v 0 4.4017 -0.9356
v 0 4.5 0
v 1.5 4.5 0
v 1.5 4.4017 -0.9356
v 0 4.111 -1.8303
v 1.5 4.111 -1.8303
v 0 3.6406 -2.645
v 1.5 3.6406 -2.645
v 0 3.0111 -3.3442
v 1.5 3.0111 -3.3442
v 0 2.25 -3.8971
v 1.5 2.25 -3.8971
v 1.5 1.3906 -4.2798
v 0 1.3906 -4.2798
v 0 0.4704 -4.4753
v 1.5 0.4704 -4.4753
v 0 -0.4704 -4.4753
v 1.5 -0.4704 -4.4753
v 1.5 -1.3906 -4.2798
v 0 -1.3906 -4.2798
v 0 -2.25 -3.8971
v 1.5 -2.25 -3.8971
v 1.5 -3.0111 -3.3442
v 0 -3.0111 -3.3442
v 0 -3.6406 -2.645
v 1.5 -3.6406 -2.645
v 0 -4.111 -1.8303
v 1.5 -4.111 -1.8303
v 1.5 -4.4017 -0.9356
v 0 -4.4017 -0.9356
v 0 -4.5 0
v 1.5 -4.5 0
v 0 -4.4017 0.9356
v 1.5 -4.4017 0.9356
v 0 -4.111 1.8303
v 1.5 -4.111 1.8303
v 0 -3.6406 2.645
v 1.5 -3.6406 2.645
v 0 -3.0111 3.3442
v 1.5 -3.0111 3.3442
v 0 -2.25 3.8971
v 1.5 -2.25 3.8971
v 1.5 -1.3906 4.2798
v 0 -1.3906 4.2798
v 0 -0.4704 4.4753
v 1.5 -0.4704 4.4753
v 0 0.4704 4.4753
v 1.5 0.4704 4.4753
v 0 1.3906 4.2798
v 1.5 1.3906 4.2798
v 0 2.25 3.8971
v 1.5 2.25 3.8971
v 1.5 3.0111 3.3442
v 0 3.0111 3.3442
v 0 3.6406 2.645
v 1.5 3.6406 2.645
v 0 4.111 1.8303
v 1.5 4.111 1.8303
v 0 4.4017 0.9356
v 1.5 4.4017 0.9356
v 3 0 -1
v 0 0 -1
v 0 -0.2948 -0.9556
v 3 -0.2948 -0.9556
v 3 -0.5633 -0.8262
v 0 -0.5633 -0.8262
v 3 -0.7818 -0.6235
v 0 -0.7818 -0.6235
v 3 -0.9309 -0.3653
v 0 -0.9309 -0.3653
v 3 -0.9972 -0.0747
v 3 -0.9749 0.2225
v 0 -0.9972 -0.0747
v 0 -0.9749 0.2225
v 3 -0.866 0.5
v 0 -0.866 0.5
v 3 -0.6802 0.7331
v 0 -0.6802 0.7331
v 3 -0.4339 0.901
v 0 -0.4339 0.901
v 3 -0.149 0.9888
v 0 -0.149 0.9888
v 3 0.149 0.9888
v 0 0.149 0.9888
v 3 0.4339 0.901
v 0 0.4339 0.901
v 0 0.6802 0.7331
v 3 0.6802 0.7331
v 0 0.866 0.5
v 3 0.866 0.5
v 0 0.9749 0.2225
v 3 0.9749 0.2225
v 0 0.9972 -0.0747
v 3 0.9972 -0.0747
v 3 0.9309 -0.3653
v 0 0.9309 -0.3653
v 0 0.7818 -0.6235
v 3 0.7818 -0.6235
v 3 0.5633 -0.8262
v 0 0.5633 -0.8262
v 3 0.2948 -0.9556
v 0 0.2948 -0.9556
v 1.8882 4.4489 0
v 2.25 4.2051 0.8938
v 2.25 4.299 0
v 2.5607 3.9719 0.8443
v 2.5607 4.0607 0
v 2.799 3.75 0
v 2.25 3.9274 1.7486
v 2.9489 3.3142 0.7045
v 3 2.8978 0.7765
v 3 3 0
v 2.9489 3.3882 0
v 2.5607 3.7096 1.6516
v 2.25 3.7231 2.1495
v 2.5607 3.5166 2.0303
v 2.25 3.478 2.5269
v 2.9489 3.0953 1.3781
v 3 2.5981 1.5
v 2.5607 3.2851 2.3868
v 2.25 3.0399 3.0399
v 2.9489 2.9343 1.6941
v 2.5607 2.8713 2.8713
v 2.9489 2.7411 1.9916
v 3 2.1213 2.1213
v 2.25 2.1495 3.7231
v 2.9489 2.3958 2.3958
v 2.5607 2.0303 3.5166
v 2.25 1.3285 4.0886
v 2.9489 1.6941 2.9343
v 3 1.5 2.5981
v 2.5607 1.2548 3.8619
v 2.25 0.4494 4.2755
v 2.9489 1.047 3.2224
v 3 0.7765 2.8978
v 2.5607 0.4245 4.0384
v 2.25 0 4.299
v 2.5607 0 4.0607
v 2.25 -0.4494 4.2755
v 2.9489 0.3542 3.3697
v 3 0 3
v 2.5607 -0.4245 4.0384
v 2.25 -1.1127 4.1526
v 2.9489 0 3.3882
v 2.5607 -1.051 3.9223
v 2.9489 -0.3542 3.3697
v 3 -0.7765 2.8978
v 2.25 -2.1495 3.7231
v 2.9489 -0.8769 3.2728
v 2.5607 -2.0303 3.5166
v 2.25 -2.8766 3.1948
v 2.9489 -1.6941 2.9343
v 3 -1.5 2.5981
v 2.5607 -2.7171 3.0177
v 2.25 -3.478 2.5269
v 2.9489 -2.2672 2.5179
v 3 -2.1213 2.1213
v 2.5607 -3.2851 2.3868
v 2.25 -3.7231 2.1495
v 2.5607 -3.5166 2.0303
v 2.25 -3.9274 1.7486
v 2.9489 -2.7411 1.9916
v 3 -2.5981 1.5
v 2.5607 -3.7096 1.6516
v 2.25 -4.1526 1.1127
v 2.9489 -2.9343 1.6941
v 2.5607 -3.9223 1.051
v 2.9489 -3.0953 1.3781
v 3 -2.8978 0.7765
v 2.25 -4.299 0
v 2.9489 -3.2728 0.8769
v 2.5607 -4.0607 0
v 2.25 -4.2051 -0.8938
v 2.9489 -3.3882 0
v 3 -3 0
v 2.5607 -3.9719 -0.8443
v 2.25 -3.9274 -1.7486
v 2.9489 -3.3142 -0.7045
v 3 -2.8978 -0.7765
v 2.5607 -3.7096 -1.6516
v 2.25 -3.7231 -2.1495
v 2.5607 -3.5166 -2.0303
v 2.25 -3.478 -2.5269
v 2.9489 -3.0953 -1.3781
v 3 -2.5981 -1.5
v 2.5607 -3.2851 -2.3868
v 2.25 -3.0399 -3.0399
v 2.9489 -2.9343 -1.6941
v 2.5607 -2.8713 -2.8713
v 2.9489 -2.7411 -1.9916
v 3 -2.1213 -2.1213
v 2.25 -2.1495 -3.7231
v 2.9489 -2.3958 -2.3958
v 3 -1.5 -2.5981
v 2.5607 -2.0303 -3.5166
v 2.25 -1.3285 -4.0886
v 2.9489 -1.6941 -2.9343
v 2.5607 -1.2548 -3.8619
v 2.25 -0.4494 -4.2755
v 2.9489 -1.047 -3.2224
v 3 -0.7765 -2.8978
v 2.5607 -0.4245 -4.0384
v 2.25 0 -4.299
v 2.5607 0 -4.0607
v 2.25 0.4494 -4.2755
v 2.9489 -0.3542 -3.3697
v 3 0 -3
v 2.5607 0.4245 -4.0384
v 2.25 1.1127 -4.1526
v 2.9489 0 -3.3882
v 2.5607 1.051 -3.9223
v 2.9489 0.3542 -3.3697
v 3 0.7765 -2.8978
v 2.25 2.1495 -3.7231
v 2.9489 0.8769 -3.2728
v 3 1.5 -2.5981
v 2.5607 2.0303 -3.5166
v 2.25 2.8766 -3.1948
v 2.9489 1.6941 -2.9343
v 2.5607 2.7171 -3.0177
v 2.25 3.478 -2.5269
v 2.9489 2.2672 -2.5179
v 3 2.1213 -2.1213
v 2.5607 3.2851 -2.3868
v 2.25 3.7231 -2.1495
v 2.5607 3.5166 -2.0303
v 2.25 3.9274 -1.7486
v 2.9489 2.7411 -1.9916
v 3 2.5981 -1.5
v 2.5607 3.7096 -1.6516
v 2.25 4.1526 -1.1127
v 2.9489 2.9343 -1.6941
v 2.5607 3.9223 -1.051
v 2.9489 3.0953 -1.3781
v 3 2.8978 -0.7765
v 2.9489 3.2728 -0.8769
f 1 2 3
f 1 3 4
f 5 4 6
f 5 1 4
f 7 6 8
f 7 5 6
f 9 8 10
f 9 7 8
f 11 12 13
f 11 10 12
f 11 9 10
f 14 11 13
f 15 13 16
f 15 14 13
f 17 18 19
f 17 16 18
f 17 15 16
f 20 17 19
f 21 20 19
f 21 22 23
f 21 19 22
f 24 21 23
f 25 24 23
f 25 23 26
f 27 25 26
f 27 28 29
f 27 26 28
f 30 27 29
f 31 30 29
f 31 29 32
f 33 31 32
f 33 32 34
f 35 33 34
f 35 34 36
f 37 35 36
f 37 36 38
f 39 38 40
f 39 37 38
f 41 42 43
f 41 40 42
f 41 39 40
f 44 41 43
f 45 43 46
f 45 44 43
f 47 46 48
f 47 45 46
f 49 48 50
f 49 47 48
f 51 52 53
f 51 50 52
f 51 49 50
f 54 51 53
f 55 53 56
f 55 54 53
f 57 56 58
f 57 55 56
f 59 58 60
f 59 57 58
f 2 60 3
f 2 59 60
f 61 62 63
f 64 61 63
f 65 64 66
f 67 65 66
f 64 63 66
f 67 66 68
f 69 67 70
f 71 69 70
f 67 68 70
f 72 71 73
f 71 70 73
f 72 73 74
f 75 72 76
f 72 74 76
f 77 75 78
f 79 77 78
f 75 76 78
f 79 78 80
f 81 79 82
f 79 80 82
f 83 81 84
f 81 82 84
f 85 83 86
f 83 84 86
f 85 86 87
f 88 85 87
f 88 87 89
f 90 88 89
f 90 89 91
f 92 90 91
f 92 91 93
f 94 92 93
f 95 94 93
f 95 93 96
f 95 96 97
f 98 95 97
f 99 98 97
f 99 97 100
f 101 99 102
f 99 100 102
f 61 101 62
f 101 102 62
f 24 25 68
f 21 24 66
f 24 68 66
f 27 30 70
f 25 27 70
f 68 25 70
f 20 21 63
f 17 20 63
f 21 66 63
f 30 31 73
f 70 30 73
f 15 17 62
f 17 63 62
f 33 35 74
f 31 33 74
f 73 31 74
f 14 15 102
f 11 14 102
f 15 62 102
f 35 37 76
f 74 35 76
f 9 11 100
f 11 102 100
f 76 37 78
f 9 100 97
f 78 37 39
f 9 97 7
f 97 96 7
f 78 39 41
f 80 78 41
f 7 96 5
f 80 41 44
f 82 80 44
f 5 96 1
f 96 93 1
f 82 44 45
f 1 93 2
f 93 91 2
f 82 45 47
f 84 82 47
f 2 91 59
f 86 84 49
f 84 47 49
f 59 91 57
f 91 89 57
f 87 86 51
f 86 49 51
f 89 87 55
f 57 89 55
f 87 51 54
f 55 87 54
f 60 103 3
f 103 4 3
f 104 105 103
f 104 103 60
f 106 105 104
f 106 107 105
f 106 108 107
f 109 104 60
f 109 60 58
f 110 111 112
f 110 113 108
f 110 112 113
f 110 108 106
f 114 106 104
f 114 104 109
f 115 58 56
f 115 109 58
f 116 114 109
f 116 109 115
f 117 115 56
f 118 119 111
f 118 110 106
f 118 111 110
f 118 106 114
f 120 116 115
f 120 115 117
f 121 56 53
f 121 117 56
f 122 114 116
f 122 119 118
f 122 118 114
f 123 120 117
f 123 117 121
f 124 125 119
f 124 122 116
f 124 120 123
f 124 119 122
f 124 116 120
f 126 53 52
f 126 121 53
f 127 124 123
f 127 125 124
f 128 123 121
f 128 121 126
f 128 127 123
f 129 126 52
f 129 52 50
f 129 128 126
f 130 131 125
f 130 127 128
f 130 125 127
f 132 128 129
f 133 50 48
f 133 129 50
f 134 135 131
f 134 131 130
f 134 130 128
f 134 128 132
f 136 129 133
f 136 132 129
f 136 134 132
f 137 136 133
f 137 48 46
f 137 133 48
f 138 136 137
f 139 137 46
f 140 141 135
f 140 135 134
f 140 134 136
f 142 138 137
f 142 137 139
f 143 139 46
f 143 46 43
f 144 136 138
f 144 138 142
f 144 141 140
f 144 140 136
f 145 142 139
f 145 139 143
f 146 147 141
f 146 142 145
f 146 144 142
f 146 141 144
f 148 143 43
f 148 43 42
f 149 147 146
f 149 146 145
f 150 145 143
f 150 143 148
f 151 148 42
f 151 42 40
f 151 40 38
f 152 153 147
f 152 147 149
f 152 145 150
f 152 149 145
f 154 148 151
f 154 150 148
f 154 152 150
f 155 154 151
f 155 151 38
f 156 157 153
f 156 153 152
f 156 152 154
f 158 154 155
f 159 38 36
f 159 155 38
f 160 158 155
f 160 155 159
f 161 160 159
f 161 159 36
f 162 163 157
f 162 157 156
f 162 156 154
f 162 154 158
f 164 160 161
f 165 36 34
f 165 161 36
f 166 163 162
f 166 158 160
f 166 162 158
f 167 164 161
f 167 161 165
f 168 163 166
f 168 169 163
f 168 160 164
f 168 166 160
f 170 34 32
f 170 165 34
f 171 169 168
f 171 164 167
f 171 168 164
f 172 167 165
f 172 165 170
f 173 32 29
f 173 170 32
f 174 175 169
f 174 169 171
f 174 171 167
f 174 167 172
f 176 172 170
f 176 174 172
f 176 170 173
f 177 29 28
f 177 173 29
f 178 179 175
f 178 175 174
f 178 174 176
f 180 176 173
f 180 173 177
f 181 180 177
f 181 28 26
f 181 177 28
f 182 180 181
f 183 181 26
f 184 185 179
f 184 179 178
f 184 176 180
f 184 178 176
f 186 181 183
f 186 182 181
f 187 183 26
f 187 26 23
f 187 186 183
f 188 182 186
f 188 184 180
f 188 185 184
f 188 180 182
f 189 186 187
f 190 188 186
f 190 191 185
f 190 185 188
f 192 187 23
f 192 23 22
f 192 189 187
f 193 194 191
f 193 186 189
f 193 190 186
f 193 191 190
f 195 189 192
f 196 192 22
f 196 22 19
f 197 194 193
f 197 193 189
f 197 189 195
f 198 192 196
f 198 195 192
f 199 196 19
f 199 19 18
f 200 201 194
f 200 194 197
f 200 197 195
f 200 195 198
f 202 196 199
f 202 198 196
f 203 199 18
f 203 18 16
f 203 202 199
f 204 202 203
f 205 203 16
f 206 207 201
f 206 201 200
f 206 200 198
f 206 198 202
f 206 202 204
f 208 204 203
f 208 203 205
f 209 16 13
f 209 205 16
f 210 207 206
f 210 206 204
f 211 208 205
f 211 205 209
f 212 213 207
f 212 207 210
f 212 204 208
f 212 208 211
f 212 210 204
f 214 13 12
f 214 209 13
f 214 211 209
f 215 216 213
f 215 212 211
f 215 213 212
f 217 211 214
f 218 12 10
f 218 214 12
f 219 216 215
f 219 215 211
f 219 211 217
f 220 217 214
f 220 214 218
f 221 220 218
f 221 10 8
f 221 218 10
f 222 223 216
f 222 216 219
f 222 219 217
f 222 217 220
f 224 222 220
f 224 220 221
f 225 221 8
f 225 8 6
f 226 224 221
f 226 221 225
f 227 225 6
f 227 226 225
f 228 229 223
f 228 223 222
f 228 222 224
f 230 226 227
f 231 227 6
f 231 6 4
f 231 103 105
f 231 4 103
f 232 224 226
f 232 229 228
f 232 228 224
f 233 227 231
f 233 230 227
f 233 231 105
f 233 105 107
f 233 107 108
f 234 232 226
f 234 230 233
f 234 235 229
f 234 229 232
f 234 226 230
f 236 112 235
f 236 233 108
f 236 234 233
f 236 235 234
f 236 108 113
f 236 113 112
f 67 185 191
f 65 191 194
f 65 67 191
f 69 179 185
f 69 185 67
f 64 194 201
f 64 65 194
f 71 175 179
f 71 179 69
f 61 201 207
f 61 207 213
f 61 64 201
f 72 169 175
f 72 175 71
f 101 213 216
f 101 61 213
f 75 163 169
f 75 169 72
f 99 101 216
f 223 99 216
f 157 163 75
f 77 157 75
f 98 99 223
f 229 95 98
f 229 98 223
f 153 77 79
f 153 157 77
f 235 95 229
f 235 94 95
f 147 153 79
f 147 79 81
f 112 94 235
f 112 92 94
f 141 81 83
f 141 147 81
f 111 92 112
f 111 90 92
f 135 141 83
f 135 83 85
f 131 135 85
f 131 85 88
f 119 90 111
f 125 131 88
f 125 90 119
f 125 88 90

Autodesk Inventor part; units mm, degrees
ref_plane "YZ Plane" through (0, 0, 0) normal (1, 0, 0) x (0, 1, 0)
ref_plane "XZ Plane" through (0, 0, 0) normal (0, 1, 0) x (-1, 0, 0)
ref_plane "XY Plane" through (0, 0, 0) normal (0, 0, 1) x (1, 0, 0)
sketch "Sketch1" plane through (0, 0, 0) normal (1, 0, 0) x (0, 1, 0)
  circle A0 centre (0, 0) radius 4
  circle A1 centre (0, 0) radius 4.5
  dimension "d0" = 8
  dimension "d1" = 0.5
extrude "Extrusion1" add sketch "Sketch1" along normal blind 3 contours A0 | A1
sketch "Sketch2" plane through (3, 0, 0) normal (1, 0, 0) x (0, 0, -1)
  circle A0 centre (0, 0) radius 4.5 construction
hole "Hole1" at (3, 0, 0) direction (-1, 0, 0) diameter 2 depth 8
fillet "Fillet1" radius 1.5 1 edges at (3, -4.5, 0)
properties part number "_3DPrint"
